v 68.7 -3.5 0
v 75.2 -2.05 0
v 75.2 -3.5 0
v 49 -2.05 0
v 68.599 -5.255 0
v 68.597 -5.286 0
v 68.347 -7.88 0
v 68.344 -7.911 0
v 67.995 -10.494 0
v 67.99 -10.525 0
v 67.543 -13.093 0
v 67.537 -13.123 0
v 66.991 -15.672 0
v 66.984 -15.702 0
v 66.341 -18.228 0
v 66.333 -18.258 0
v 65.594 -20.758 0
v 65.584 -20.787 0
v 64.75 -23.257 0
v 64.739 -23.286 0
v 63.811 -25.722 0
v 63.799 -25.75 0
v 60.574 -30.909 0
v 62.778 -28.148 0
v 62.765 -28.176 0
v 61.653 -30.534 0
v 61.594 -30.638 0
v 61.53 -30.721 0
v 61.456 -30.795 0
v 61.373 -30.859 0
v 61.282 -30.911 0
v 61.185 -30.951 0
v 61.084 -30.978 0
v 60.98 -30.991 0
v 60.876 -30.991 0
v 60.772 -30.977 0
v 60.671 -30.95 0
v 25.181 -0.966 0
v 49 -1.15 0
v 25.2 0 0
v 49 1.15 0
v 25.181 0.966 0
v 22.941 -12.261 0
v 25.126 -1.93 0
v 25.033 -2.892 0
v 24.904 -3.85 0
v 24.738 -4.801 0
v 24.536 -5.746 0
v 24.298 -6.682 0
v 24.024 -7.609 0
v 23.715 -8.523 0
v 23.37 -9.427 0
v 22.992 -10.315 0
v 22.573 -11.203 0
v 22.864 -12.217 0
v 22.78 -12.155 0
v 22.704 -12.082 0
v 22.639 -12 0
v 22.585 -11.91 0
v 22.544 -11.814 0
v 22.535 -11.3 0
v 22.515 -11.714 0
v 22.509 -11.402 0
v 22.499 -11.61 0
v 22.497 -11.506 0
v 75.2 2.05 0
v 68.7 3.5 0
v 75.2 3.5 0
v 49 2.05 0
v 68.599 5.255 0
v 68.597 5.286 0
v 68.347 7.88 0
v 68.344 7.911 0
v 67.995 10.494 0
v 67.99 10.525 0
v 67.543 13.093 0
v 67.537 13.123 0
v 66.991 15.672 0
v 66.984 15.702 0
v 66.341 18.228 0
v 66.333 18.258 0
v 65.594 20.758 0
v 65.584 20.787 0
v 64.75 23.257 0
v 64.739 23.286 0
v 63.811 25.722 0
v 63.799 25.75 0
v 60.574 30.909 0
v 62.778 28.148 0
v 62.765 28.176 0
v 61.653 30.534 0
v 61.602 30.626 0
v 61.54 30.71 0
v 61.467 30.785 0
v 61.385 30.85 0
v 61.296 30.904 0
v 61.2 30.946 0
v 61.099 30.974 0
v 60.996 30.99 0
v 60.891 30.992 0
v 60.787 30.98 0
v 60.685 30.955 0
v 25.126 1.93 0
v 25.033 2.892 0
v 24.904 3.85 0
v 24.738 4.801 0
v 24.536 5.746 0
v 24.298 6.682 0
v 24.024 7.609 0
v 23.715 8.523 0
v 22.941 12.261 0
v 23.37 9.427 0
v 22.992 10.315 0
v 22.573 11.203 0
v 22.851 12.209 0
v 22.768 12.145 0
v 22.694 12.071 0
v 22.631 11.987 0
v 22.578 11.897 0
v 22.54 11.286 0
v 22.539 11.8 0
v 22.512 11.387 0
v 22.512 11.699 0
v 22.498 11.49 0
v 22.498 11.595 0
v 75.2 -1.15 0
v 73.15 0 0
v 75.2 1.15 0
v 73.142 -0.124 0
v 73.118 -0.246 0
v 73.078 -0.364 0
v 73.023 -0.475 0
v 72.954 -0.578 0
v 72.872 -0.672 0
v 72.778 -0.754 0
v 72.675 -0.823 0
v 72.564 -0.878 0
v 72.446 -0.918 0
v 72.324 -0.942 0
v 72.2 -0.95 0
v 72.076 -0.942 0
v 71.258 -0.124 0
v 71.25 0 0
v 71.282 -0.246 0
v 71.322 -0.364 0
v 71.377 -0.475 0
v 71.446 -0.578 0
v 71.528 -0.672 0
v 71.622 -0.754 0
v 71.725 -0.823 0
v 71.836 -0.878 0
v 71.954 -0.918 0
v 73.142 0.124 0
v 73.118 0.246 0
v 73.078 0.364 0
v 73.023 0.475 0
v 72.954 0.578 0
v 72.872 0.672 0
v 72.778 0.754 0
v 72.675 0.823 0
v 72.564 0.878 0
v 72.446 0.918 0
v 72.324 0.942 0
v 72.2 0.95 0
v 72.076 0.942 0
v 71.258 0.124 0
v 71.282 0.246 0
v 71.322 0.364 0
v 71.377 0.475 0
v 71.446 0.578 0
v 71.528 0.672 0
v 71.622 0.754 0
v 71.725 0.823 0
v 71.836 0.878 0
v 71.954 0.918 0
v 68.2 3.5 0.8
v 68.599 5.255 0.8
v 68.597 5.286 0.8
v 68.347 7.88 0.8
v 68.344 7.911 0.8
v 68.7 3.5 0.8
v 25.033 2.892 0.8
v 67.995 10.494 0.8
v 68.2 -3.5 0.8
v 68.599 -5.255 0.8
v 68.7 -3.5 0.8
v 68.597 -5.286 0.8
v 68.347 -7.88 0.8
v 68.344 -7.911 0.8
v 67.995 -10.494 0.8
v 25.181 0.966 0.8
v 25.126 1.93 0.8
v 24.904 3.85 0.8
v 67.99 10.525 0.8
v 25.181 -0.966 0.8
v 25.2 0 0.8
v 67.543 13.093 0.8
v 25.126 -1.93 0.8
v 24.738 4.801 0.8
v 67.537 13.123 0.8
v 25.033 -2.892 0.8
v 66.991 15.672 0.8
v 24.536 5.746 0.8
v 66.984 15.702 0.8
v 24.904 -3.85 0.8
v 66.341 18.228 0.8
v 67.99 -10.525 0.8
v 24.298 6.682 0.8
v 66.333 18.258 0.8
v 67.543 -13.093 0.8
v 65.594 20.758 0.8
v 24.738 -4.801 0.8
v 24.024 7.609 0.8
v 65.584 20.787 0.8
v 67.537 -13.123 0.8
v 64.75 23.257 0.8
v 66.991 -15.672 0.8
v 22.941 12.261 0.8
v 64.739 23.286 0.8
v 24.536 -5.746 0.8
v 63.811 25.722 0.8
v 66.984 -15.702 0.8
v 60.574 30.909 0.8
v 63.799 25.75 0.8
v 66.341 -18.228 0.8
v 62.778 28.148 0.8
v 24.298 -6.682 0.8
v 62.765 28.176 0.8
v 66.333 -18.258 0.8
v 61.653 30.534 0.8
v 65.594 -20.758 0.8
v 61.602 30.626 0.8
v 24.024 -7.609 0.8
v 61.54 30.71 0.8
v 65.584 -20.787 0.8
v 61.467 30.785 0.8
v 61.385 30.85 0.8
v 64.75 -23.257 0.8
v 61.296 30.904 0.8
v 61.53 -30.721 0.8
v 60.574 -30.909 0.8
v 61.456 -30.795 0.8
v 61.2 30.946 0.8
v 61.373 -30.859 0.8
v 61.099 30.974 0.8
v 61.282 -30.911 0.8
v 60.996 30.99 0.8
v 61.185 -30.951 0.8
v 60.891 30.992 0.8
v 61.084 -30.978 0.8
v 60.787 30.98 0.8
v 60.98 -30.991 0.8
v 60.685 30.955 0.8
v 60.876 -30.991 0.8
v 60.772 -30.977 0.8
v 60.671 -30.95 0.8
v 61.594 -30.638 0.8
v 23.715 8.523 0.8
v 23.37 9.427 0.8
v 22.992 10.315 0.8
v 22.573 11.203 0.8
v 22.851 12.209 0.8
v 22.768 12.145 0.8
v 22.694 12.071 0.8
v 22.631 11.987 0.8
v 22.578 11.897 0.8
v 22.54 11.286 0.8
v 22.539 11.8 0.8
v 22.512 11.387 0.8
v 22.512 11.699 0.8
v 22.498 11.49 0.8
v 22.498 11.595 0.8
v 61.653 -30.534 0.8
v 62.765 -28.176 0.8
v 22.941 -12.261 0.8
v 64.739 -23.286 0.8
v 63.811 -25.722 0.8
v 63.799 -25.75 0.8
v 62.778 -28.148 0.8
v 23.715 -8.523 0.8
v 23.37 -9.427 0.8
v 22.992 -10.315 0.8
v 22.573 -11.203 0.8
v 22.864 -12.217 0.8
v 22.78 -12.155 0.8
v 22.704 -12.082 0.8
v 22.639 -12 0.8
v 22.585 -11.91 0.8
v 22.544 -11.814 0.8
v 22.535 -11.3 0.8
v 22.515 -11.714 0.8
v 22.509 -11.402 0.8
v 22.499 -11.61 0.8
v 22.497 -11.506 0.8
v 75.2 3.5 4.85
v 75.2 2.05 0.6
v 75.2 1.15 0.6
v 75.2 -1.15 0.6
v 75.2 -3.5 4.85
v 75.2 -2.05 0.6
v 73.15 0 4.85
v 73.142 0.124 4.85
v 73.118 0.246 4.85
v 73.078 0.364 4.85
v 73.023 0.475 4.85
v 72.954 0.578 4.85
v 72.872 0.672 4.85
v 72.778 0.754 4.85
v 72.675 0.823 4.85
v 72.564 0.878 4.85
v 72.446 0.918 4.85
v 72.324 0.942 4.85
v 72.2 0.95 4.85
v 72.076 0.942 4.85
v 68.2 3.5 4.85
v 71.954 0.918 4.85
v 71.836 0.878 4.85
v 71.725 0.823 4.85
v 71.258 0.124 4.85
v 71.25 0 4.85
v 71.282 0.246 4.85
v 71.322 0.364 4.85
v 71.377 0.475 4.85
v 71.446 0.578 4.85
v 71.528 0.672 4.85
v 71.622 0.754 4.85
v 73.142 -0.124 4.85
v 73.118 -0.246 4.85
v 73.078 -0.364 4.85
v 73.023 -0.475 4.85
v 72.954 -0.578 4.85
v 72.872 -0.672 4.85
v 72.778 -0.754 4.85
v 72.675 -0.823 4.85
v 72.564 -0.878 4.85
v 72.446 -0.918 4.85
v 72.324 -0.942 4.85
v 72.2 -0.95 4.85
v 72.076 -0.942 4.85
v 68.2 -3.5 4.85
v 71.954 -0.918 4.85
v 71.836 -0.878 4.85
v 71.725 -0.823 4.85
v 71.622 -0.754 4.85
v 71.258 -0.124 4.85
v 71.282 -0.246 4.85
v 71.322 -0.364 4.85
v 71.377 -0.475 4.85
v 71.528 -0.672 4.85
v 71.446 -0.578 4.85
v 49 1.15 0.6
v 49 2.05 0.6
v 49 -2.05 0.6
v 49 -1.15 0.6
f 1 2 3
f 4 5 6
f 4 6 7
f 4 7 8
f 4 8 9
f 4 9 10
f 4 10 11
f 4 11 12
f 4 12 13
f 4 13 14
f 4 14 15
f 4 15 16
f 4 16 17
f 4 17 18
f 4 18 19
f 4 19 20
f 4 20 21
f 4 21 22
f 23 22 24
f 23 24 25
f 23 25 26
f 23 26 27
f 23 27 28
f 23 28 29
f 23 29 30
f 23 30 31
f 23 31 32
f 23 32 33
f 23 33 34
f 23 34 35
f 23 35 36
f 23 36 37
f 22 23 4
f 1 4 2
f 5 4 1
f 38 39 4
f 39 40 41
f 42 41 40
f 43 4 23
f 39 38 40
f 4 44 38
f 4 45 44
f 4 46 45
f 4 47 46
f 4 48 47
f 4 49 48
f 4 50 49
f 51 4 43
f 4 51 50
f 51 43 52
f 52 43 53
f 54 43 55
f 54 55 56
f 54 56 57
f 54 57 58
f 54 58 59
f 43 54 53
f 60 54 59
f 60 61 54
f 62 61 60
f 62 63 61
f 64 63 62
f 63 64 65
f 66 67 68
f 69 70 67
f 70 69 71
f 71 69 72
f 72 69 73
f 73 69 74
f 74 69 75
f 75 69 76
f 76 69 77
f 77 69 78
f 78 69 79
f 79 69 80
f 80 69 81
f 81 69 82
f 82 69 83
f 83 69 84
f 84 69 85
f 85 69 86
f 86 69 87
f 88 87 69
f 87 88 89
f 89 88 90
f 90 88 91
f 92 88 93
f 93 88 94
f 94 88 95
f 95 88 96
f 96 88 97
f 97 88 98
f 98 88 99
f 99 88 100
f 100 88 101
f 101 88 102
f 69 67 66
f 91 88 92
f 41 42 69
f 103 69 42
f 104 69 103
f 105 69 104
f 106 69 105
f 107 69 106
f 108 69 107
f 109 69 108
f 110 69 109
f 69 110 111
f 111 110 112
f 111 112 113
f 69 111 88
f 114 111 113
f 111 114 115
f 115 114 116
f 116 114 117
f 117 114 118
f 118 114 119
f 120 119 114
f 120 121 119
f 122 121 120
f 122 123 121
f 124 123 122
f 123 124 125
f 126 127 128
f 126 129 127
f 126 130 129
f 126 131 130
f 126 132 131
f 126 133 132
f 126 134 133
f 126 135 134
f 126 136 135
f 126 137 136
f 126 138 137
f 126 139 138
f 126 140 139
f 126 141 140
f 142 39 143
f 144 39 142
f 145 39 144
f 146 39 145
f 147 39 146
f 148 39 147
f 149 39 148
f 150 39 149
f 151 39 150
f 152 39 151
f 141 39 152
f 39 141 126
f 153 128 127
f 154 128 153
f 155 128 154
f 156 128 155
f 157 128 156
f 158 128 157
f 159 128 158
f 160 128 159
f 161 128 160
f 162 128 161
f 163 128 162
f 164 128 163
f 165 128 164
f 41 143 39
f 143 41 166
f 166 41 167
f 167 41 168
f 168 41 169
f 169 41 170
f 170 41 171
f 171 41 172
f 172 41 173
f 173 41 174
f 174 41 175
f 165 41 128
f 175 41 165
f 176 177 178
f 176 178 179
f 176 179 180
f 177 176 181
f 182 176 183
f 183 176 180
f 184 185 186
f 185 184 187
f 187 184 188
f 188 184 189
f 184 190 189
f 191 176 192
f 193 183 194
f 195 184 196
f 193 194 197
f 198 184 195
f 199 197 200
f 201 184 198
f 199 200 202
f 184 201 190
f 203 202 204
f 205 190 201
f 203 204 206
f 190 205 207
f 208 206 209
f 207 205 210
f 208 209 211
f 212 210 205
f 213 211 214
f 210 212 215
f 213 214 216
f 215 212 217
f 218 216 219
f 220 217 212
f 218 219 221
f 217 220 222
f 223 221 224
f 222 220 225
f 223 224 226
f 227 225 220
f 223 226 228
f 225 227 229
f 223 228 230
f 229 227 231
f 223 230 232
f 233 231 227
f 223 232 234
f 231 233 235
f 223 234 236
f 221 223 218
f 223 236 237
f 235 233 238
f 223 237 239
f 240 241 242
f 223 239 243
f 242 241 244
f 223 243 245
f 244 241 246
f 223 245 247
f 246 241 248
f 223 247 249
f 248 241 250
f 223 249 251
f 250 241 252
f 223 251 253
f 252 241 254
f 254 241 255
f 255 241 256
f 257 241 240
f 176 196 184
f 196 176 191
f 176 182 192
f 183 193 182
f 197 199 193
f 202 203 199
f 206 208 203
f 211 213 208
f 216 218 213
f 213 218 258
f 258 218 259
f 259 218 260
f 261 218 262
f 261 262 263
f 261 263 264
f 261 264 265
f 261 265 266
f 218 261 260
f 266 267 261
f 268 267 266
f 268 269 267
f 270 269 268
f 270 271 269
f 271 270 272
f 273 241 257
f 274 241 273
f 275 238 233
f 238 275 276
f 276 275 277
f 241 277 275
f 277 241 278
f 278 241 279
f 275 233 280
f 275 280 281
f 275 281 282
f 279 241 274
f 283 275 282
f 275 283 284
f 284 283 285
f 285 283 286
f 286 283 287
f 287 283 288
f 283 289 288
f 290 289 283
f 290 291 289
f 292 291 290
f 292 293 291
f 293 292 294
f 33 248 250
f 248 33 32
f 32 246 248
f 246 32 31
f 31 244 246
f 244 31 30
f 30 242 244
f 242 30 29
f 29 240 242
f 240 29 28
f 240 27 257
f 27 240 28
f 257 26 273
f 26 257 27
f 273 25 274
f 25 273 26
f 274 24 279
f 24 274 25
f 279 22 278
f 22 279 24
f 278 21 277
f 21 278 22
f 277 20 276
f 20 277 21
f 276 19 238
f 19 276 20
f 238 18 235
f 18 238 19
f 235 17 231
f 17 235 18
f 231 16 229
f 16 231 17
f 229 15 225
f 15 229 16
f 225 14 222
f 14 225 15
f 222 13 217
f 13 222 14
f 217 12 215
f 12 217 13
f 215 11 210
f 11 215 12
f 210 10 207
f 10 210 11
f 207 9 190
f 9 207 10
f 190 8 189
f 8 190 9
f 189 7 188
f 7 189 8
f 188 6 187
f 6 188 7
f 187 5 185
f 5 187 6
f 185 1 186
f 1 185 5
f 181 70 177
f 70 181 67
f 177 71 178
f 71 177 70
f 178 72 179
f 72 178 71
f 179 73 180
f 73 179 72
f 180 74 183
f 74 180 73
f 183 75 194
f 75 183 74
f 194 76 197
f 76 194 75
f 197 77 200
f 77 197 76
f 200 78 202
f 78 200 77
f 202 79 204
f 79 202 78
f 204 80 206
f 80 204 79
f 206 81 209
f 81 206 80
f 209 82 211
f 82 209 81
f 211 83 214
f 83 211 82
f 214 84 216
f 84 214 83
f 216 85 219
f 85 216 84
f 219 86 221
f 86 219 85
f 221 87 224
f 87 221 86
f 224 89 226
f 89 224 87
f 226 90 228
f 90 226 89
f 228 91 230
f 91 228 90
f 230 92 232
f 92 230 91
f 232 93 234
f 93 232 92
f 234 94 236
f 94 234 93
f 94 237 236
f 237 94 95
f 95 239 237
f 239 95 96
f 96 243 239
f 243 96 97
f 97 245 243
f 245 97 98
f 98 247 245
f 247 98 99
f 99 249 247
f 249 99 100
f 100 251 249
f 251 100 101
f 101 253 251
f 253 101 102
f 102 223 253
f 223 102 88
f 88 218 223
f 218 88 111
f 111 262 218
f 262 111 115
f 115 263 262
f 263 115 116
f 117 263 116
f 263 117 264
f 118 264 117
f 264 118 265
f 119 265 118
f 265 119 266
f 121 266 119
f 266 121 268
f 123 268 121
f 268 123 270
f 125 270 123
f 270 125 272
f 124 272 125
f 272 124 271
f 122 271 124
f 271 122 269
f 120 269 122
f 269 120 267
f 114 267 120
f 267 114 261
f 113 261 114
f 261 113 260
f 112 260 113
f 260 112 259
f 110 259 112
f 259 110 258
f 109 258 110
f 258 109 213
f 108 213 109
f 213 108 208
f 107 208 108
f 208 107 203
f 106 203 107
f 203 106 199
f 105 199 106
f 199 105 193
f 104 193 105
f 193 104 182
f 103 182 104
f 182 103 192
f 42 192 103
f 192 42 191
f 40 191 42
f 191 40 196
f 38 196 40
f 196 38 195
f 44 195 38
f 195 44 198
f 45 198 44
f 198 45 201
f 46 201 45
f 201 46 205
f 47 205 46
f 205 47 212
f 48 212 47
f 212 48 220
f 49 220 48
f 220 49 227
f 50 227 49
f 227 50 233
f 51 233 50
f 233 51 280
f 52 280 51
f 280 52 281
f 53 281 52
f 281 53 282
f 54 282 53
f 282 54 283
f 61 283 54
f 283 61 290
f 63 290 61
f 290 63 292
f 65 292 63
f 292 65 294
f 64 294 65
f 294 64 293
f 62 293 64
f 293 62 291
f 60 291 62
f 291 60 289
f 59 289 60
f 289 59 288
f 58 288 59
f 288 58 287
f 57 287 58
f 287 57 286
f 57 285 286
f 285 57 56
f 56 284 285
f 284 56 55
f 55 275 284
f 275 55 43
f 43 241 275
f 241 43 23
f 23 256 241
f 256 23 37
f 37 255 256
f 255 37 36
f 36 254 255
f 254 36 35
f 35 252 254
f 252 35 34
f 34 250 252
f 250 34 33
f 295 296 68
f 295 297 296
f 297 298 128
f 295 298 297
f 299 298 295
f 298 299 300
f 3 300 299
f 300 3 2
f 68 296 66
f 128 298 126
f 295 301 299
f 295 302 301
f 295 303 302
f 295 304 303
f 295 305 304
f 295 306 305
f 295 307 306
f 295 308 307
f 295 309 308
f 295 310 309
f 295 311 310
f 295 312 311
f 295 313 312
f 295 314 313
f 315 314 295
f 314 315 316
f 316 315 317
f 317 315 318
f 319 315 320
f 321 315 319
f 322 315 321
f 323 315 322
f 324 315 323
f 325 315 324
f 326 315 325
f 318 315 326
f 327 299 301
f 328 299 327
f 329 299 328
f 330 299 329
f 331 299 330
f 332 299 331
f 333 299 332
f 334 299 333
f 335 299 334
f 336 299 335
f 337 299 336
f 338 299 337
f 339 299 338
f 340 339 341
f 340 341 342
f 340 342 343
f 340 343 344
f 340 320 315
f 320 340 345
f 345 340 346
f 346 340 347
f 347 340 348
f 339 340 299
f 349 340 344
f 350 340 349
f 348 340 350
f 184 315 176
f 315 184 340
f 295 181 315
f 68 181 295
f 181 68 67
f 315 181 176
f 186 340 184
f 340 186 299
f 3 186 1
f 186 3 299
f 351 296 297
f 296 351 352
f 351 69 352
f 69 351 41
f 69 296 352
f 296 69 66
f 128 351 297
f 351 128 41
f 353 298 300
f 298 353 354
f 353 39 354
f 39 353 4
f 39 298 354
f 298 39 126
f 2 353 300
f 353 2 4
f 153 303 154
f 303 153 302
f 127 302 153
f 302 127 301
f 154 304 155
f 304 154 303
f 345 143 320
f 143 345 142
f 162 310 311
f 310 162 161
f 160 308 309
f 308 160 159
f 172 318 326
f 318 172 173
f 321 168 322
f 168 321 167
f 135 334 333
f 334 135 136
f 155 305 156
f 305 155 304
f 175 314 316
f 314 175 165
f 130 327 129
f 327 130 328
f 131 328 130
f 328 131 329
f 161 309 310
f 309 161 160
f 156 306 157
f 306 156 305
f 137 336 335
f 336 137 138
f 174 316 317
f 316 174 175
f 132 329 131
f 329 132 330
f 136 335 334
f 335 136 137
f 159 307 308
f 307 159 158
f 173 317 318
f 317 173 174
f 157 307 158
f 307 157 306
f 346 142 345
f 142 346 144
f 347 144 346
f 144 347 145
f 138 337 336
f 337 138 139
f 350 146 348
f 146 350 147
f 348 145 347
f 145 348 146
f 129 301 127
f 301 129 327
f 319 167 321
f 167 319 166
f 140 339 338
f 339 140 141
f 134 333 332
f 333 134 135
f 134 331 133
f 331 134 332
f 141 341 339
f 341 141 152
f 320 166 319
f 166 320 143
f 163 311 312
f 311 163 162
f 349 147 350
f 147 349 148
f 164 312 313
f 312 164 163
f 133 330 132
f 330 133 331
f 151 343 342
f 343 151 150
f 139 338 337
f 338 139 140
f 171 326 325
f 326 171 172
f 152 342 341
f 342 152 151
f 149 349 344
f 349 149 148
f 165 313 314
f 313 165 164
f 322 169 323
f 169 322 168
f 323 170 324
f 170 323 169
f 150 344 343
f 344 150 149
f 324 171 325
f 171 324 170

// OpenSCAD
// file: parameters.scad
// =============================================================================
// Gen-BS — nightly 2026-10-09 (physics_scorer, honest magpylib watts)
// Pull the whole machine 2 mm inward: poles at R48 (was R50) with 26–68 mm bobbins and an 18.5 mm build. Shorter mean turn length lets each coil hold 612 turns on about 356 m of copper — ~14 m less than Gen-BO, which leaves real slack on a ~390 m spool for leads, a re-wind or a short spool — for about 1.7 % less power. Same Ø134 steel discs as Gen-BO.
// Clocking 0 deg (magnets N facing S) + D-flat keyed bore + index notch + flip-symmetric hole map.
// Windable 2-piece bobbin; turns = physics_scorer turns_fit; copper only between flanges.
// Steel back-iron: 2× Ø134 × 4.76 mm (3/16") mild-steel discs (steel_backiron_disc.dxf); magnets sit ON the steel
// (through-pockets) -> score with --back-iron.
// =============================================================================
topology            = "dual_rotor";

// --- Wire / winding (physics_scorer winding-fit) -------------------------------
wire_awg            = 26;
wire_od             = 0.45;     // insulated OD mm (bare 0.405)
fill_realistic      = 0.65;     // insulated-wire area / window (DENSE layered wind with a jig; scorer cap 0.65)
turns               = 612;       // = physics_scorer turns_fit (do NOT raise)
coil_former_type    = "bobbin";
coil_core_inset     = 18.50;     // radial copper build: hub = copper boundary inset by this
wind_build_axial    = 0.0;      // nothing proud of the flanges
wind_build_radial   = 0.0;

// --- Bobbin (base + lid) ---------------------------------------------------------
coil_id_r           = 26.00;    // copper boundary sector
coil_od_r           = 68.00;
span_deg            = 52.72;    // = pitch - 2*asin((wall+0.85)/coil_id_r) -> >=1.2 mm stator web
former_web          = 8.10;     // copper height between flanges (TALL copper: steel keeps Bz up)
flange_t            = 0.80;     // >= 0.8 mm FDM wall rule (tall winds push on the flanges)
wall                = 0.80;     // flange lip beyond copper
former_bare_h       = former_web + 2 * flange_t;
coil_envelope_h     = former_bare_h + 2 * wind_build_axial;
tab_w               = 7.0;
tab_len             = 7.0;
tab_h               = former_bare_h / 2;
pin_d               = 1.9;      // 1.75 mm filament locating pin
coil_mount_r        = coil_od_r + 0.2 + 4.0;
lead_y              = 1.6;
lead_slot_w         = 0.9;
lead_groove_d       = 0.6;

// --- Gap -------------------------------------------------------------------------
run_clear           = 0.50;     // rotor face -> flange
gap_spacer_h        = run_clear + wind_build_axial;
m2m                 = coil_envelope_h + 2 * run_clear;   // rotor face to rotor face (= gap_sleeve length)

// --- Stator ----------------------------------------------------------------------
coil_stations       = 6;
bay_clear           = 0.25;
stator_thick        = former_bare_h;                        // bobbins flush both faces
stator_od           = 156.0;
shaft_clear_stator  = 14.0;     // stator is static; gap sleeve OD 12 spins inside

// --- Rotor(s) --------------------------------------------------------------------
magnet_Br           = 1.43;     // N52
magnet_d_large      = 20.0;
magnet_h_large      = 5.0;      // one O20x5 per pocket
magnet_h_small      = 5.0;      // one O5x5 per pocket
halbach_magnetisation = "diametric"; // O5x5 assist magnets MUST be DIAMETRICALLY magnetised (tangential)
rotor_b_same_axis   = true;     // same-index magnets share one axis: N faces S across the gap
large_pocket_d      = 20.3;
small_pocket_d      = 5.3;
pocket_h            = 5.00;     // THROUGH the carrier: magnet back face sits on the steel disc (FLUSH seat: carrier = magnet height, magnet face level with the rotor face)
large_n             = 8;
R_large             = 48.0;
R_small_inner       = 41.8;
R_small_mid         = 48.0;
R_small_outer       = 54.2;
small_r_list        = [R_small_inner, R_small_mid, R_small_outer];   // O5 pockets between poles
carrier_od          = 134.0;
carrier_thick       = pocket_h;
hub_h               = 12.0;     // > steel_t + insert: radial set-screw clears the steel
hub_od              = 24.0;     // slim hub so the M4 brace rods fit at R~18 inside the coil ring
hub_insert_d        = 4.0;      // M3 heat-set insert, radial, bears on the D-flat
rotor_b_offset_deg  = 0.0;      // CLOCKING: magnets directly opposite
shaft_key           = "dflat";
dflat_depth         = 0.5;      // 8 mm shaft with 0.5 mm flat (7.5 across flat)
index_notch_d       = 3.0;

// --- Steel back-iron (buyable laser-cut) -------------------------------------------
steel_t             = 4.76;      // mild steel thickness (image method ignores it; sized from steel_flux.py so the return path stays well below saturation)
steel_center_hole   = 26.0;     // slips over the rotor hub (OD 24)
steel_od            = carrier_od;   // steel disc OD = rotor carrier OD

// --- Modular MAX interface ----------------------------------------------------------
shaft_bore          = 8.35;
dflat_x             = 4.0 - dflat_depth + (shaft_bore - 8.0) / 2;
bearing_d           = 21.85;
bearing_h           = 7.2;
m3_clear            = 3.5;
bolt_r_inner        = 30.0;     // M3 steel-disc clamp bolts (inside the magnet ring)
bolt_n_inner        = 4;
bolt_inner_angles   = [0, 90, 180, 270];
bolt_r_outer        = 63.0;     // M3 steel-disc clamp bolts (outside the magnet ring)
bolt_outer_angles   = [45, 135, 225, 315];
flange_bolt_r       = 73.0;     // frame rods: OUTSIDE the rotor OD (rotors spin inside them)
flange_bolt_n       = 6;
flange_bolt_offset  = 30.00;    // between coil stations -> never cuts a lead groove/tab
brace_r             = 18.0;
brace_d             = 4.3;      // temporary M4 jack rods (assembly only)
brace_n             = 4;
brace_angles        = [45, 135, 225, 315];          // flip-symmetric

spacer_pad_od       = 14.0;
spacer_pad_id       = m3_clear;
endbell_od          = 156.0;
endbell_thick       = 8.0;
endbell_shaft_clear = 10.0;
collar_h            = 10.0;
standoff_od         = 9.0;
frame_standoff_h    = run_clear + carrier_thick + hub_h + collar_h + 2.0;
sleeve_od           = 12.0;
plate_max_mm        = 410;

$fn = 64;
// main file
// Gen-BS — bobbin LID (top flange + locating tab). Print x6, flange face DOWN on the bed.
// CA-glue onto the hub top BEFORE winding. Tab = lap joint into the stator tab pocket; 1.75 mm filament
// pin through pin hole + stator ledge, trim flush. Lead slots carry both leads flush.
include <parameters.scad>;
$fn = 48;
module sector_2d(r_in, r_out, ang) {
    polygon([
        for (a = [-ang/2 : ang/24 : ang/2]) [r_in*cos(a), r_in*sin(a)],
        for (a = [ang/2 : -ang/24 : -ang/2]) [r_out*cos(a), r_out*sin(a)]
    ]);
}
module footprint_2d() { offset(r=wall) sector_2d(coil_id_r, coil_od_r, span_deg); }
module hub_2d()       { offset(delta=-coil_core_inset) sector_2d(coil_id_r, coil_od_r, span_deg); }

difference() {
    union() {
        linear_extrude(flange_t) footprint_2d();
        translate([coil_od_r + 0.2, -tab_w/2, 0]) cube([tab_len, tab_w, tab_h]);
    }
    translate([coil_mount_r, 0, -0.1]) cylinder(d=pin_d, h=tab_h + 1);
    for (y = [lead_y, -lead_y])
        translate([coil_od_r - coil_core_inset - 0.5, y - lead_slot_w/2, -0.1])
            cube([coil_core_inset + tab_len + 2, lead_slot_w, lead_groove_d + 0.1]);
}
